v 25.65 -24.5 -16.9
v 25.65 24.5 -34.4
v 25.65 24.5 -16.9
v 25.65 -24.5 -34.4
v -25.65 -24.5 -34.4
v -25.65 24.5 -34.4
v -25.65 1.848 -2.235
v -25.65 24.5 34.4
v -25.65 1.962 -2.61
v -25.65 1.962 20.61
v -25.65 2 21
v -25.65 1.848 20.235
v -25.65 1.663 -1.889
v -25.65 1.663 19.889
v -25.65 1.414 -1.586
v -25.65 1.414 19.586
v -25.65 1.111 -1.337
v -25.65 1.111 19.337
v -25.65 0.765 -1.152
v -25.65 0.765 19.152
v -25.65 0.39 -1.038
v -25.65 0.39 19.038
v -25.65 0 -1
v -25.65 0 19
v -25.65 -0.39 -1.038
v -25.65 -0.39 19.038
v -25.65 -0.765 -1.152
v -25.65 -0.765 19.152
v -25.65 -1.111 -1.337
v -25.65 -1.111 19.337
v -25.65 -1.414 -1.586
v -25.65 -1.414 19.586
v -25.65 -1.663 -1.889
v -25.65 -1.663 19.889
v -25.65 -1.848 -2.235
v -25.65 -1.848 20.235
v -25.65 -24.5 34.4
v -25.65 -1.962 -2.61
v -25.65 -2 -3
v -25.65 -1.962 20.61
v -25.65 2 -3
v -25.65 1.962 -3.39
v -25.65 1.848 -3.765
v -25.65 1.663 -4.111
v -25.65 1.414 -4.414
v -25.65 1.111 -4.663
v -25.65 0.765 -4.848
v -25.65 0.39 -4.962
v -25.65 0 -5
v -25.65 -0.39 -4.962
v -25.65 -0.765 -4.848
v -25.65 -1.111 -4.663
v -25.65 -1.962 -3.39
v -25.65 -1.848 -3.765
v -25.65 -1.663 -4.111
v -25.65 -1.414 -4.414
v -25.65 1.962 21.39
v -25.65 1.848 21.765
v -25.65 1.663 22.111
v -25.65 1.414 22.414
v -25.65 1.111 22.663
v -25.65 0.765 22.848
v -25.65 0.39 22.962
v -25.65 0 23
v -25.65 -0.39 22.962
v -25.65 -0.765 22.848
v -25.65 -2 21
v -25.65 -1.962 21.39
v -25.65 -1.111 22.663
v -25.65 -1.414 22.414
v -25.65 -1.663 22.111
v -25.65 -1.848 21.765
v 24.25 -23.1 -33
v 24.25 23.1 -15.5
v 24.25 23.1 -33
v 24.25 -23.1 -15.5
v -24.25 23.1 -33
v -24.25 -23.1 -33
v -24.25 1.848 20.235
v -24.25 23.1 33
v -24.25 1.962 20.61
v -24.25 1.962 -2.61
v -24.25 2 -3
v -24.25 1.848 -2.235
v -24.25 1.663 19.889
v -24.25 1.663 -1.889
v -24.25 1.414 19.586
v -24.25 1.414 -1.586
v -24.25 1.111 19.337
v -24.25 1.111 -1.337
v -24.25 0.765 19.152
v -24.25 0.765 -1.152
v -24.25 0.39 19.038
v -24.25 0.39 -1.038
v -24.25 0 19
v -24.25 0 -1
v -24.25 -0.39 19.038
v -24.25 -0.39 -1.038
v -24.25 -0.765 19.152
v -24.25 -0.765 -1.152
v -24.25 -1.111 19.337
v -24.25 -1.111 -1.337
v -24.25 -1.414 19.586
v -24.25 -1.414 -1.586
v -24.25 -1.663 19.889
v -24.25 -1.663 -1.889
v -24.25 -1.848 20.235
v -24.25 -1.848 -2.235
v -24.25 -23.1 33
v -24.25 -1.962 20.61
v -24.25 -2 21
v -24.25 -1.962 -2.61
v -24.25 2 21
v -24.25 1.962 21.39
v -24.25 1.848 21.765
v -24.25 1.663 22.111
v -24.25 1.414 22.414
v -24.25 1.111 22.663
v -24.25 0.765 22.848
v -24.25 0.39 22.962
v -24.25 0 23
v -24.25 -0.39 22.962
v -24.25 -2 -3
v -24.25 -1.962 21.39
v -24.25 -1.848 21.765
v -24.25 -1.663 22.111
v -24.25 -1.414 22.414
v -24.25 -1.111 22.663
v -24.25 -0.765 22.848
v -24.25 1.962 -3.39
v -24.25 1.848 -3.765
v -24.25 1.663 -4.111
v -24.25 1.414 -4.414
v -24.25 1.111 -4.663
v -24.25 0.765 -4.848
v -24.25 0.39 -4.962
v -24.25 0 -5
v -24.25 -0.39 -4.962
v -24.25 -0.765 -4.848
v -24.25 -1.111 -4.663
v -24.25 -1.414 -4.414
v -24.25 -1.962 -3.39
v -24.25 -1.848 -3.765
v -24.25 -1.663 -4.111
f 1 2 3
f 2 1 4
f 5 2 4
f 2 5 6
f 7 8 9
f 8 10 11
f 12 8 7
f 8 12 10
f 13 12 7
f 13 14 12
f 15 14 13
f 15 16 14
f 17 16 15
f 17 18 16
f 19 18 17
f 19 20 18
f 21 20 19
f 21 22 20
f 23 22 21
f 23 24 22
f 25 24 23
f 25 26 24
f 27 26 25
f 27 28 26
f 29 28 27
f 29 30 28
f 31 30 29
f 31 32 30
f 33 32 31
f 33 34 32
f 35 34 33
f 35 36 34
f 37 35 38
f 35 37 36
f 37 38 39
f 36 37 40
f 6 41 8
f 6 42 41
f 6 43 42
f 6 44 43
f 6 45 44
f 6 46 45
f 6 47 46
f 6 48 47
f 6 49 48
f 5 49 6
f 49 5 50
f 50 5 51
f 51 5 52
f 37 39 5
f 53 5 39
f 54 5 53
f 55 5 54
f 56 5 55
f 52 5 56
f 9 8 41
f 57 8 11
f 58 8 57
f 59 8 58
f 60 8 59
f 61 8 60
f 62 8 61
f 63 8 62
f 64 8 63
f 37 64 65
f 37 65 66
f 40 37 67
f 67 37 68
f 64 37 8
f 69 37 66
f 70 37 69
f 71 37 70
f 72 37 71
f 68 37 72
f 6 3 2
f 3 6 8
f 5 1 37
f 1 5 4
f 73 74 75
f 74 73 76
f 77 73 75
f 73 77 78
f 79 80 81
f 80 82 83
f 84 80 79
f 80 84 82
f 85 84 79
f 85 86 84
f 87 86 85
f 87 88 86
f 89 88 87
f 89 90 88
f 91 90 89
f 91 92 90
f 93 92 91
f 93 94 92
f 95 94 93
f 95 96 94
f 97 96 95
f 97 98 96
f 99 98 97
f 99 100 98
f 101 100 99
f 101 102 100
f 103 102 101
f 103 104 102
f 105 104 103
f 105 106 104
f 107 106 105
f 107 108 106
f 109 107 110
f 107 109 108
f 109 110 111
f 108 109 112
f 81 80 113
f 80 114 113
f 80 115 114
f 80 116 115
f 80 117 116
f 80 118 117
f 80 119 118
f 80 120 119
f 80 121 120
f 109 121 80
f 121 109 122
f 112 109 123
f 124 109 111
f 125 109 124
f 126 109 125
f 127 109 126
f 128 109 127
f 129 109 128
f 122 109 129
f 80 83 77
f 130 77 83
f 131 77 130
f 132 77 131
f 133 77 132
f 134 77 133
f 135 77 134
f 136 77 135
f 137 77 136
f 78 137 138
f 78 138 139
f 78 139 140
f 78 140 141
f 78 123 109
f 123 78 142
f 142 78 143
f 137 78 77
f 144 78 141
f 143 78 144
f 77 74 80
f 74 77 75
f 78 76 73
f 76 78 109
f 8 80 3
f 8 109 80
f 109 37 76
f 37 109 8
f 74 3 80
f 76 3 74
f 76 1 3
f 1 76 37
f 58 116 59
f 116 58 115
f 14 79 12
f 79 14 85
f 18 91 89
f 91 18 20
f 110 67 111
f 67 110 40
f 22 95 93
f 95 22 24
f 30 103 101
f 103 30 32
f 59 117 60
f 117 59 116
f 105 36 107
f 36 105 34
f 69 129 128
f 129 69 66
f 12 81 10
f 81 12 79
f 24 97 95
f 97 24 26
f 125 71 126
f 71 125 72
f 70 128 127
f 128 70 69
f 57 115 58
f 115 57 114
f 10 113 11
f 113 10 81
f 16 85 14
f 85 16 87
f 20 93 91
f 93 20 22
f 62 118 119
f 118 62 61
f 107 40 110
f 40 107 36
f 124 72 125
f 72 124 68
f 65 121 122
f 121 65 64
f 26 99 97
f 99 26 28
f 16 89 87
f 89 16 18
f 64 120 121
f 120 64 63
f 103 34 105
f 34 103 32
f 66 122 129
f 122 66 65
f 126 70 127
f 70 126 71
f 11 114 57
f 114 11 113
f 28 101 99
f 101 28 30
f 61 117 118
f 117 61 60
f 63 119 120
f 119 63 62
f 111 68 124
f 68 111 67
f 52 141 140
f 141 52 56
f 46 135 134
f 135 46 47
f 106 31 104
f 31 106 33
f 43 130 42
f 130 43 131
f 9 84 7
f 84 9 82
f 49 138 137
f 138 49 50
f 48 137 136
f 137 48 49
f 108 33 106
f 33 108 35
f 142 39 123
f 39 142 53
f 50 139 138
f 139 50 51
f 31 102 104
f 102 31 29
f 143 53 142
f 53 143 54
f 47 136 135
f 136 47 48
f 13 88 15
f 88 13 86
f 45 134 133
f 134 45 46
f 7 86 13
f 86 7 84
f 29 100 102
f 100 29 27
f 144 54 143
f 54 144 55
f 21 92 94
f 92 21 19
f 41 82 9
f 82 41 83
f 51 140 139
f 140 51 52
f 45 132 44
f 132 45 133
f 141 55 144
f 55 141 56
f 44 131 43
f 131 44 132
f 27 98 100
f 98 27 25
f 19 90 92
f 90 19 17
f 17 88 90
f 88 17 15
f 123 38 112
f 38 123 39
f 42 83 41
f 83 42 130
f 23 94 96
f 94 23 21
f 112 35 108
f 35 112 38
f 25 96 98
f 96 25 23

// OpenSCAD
$fn=32;

w = 48.5;
d = 46.2;
h = 66;

wall = 1.4;

difference() {
    cube([w+2*wall, d+2*wall, h+2*wall], center=true);
    
    cube([w,d,h], center=true);

    translate([-w/2,0,h/2])
    rotate([0,45,0])
    translate([0, 0, h/2])
    cube([200, d+10, h], center=true);
    
    translate([0,0, h/2-12])
    rotate([0,90,0])
    cylinder(h=100, d=4, center=true);
    
    translate([0,0, h/2-36])
    rotate([0,90,0])
    cylinder(h=100, d=4, center=true);
}
